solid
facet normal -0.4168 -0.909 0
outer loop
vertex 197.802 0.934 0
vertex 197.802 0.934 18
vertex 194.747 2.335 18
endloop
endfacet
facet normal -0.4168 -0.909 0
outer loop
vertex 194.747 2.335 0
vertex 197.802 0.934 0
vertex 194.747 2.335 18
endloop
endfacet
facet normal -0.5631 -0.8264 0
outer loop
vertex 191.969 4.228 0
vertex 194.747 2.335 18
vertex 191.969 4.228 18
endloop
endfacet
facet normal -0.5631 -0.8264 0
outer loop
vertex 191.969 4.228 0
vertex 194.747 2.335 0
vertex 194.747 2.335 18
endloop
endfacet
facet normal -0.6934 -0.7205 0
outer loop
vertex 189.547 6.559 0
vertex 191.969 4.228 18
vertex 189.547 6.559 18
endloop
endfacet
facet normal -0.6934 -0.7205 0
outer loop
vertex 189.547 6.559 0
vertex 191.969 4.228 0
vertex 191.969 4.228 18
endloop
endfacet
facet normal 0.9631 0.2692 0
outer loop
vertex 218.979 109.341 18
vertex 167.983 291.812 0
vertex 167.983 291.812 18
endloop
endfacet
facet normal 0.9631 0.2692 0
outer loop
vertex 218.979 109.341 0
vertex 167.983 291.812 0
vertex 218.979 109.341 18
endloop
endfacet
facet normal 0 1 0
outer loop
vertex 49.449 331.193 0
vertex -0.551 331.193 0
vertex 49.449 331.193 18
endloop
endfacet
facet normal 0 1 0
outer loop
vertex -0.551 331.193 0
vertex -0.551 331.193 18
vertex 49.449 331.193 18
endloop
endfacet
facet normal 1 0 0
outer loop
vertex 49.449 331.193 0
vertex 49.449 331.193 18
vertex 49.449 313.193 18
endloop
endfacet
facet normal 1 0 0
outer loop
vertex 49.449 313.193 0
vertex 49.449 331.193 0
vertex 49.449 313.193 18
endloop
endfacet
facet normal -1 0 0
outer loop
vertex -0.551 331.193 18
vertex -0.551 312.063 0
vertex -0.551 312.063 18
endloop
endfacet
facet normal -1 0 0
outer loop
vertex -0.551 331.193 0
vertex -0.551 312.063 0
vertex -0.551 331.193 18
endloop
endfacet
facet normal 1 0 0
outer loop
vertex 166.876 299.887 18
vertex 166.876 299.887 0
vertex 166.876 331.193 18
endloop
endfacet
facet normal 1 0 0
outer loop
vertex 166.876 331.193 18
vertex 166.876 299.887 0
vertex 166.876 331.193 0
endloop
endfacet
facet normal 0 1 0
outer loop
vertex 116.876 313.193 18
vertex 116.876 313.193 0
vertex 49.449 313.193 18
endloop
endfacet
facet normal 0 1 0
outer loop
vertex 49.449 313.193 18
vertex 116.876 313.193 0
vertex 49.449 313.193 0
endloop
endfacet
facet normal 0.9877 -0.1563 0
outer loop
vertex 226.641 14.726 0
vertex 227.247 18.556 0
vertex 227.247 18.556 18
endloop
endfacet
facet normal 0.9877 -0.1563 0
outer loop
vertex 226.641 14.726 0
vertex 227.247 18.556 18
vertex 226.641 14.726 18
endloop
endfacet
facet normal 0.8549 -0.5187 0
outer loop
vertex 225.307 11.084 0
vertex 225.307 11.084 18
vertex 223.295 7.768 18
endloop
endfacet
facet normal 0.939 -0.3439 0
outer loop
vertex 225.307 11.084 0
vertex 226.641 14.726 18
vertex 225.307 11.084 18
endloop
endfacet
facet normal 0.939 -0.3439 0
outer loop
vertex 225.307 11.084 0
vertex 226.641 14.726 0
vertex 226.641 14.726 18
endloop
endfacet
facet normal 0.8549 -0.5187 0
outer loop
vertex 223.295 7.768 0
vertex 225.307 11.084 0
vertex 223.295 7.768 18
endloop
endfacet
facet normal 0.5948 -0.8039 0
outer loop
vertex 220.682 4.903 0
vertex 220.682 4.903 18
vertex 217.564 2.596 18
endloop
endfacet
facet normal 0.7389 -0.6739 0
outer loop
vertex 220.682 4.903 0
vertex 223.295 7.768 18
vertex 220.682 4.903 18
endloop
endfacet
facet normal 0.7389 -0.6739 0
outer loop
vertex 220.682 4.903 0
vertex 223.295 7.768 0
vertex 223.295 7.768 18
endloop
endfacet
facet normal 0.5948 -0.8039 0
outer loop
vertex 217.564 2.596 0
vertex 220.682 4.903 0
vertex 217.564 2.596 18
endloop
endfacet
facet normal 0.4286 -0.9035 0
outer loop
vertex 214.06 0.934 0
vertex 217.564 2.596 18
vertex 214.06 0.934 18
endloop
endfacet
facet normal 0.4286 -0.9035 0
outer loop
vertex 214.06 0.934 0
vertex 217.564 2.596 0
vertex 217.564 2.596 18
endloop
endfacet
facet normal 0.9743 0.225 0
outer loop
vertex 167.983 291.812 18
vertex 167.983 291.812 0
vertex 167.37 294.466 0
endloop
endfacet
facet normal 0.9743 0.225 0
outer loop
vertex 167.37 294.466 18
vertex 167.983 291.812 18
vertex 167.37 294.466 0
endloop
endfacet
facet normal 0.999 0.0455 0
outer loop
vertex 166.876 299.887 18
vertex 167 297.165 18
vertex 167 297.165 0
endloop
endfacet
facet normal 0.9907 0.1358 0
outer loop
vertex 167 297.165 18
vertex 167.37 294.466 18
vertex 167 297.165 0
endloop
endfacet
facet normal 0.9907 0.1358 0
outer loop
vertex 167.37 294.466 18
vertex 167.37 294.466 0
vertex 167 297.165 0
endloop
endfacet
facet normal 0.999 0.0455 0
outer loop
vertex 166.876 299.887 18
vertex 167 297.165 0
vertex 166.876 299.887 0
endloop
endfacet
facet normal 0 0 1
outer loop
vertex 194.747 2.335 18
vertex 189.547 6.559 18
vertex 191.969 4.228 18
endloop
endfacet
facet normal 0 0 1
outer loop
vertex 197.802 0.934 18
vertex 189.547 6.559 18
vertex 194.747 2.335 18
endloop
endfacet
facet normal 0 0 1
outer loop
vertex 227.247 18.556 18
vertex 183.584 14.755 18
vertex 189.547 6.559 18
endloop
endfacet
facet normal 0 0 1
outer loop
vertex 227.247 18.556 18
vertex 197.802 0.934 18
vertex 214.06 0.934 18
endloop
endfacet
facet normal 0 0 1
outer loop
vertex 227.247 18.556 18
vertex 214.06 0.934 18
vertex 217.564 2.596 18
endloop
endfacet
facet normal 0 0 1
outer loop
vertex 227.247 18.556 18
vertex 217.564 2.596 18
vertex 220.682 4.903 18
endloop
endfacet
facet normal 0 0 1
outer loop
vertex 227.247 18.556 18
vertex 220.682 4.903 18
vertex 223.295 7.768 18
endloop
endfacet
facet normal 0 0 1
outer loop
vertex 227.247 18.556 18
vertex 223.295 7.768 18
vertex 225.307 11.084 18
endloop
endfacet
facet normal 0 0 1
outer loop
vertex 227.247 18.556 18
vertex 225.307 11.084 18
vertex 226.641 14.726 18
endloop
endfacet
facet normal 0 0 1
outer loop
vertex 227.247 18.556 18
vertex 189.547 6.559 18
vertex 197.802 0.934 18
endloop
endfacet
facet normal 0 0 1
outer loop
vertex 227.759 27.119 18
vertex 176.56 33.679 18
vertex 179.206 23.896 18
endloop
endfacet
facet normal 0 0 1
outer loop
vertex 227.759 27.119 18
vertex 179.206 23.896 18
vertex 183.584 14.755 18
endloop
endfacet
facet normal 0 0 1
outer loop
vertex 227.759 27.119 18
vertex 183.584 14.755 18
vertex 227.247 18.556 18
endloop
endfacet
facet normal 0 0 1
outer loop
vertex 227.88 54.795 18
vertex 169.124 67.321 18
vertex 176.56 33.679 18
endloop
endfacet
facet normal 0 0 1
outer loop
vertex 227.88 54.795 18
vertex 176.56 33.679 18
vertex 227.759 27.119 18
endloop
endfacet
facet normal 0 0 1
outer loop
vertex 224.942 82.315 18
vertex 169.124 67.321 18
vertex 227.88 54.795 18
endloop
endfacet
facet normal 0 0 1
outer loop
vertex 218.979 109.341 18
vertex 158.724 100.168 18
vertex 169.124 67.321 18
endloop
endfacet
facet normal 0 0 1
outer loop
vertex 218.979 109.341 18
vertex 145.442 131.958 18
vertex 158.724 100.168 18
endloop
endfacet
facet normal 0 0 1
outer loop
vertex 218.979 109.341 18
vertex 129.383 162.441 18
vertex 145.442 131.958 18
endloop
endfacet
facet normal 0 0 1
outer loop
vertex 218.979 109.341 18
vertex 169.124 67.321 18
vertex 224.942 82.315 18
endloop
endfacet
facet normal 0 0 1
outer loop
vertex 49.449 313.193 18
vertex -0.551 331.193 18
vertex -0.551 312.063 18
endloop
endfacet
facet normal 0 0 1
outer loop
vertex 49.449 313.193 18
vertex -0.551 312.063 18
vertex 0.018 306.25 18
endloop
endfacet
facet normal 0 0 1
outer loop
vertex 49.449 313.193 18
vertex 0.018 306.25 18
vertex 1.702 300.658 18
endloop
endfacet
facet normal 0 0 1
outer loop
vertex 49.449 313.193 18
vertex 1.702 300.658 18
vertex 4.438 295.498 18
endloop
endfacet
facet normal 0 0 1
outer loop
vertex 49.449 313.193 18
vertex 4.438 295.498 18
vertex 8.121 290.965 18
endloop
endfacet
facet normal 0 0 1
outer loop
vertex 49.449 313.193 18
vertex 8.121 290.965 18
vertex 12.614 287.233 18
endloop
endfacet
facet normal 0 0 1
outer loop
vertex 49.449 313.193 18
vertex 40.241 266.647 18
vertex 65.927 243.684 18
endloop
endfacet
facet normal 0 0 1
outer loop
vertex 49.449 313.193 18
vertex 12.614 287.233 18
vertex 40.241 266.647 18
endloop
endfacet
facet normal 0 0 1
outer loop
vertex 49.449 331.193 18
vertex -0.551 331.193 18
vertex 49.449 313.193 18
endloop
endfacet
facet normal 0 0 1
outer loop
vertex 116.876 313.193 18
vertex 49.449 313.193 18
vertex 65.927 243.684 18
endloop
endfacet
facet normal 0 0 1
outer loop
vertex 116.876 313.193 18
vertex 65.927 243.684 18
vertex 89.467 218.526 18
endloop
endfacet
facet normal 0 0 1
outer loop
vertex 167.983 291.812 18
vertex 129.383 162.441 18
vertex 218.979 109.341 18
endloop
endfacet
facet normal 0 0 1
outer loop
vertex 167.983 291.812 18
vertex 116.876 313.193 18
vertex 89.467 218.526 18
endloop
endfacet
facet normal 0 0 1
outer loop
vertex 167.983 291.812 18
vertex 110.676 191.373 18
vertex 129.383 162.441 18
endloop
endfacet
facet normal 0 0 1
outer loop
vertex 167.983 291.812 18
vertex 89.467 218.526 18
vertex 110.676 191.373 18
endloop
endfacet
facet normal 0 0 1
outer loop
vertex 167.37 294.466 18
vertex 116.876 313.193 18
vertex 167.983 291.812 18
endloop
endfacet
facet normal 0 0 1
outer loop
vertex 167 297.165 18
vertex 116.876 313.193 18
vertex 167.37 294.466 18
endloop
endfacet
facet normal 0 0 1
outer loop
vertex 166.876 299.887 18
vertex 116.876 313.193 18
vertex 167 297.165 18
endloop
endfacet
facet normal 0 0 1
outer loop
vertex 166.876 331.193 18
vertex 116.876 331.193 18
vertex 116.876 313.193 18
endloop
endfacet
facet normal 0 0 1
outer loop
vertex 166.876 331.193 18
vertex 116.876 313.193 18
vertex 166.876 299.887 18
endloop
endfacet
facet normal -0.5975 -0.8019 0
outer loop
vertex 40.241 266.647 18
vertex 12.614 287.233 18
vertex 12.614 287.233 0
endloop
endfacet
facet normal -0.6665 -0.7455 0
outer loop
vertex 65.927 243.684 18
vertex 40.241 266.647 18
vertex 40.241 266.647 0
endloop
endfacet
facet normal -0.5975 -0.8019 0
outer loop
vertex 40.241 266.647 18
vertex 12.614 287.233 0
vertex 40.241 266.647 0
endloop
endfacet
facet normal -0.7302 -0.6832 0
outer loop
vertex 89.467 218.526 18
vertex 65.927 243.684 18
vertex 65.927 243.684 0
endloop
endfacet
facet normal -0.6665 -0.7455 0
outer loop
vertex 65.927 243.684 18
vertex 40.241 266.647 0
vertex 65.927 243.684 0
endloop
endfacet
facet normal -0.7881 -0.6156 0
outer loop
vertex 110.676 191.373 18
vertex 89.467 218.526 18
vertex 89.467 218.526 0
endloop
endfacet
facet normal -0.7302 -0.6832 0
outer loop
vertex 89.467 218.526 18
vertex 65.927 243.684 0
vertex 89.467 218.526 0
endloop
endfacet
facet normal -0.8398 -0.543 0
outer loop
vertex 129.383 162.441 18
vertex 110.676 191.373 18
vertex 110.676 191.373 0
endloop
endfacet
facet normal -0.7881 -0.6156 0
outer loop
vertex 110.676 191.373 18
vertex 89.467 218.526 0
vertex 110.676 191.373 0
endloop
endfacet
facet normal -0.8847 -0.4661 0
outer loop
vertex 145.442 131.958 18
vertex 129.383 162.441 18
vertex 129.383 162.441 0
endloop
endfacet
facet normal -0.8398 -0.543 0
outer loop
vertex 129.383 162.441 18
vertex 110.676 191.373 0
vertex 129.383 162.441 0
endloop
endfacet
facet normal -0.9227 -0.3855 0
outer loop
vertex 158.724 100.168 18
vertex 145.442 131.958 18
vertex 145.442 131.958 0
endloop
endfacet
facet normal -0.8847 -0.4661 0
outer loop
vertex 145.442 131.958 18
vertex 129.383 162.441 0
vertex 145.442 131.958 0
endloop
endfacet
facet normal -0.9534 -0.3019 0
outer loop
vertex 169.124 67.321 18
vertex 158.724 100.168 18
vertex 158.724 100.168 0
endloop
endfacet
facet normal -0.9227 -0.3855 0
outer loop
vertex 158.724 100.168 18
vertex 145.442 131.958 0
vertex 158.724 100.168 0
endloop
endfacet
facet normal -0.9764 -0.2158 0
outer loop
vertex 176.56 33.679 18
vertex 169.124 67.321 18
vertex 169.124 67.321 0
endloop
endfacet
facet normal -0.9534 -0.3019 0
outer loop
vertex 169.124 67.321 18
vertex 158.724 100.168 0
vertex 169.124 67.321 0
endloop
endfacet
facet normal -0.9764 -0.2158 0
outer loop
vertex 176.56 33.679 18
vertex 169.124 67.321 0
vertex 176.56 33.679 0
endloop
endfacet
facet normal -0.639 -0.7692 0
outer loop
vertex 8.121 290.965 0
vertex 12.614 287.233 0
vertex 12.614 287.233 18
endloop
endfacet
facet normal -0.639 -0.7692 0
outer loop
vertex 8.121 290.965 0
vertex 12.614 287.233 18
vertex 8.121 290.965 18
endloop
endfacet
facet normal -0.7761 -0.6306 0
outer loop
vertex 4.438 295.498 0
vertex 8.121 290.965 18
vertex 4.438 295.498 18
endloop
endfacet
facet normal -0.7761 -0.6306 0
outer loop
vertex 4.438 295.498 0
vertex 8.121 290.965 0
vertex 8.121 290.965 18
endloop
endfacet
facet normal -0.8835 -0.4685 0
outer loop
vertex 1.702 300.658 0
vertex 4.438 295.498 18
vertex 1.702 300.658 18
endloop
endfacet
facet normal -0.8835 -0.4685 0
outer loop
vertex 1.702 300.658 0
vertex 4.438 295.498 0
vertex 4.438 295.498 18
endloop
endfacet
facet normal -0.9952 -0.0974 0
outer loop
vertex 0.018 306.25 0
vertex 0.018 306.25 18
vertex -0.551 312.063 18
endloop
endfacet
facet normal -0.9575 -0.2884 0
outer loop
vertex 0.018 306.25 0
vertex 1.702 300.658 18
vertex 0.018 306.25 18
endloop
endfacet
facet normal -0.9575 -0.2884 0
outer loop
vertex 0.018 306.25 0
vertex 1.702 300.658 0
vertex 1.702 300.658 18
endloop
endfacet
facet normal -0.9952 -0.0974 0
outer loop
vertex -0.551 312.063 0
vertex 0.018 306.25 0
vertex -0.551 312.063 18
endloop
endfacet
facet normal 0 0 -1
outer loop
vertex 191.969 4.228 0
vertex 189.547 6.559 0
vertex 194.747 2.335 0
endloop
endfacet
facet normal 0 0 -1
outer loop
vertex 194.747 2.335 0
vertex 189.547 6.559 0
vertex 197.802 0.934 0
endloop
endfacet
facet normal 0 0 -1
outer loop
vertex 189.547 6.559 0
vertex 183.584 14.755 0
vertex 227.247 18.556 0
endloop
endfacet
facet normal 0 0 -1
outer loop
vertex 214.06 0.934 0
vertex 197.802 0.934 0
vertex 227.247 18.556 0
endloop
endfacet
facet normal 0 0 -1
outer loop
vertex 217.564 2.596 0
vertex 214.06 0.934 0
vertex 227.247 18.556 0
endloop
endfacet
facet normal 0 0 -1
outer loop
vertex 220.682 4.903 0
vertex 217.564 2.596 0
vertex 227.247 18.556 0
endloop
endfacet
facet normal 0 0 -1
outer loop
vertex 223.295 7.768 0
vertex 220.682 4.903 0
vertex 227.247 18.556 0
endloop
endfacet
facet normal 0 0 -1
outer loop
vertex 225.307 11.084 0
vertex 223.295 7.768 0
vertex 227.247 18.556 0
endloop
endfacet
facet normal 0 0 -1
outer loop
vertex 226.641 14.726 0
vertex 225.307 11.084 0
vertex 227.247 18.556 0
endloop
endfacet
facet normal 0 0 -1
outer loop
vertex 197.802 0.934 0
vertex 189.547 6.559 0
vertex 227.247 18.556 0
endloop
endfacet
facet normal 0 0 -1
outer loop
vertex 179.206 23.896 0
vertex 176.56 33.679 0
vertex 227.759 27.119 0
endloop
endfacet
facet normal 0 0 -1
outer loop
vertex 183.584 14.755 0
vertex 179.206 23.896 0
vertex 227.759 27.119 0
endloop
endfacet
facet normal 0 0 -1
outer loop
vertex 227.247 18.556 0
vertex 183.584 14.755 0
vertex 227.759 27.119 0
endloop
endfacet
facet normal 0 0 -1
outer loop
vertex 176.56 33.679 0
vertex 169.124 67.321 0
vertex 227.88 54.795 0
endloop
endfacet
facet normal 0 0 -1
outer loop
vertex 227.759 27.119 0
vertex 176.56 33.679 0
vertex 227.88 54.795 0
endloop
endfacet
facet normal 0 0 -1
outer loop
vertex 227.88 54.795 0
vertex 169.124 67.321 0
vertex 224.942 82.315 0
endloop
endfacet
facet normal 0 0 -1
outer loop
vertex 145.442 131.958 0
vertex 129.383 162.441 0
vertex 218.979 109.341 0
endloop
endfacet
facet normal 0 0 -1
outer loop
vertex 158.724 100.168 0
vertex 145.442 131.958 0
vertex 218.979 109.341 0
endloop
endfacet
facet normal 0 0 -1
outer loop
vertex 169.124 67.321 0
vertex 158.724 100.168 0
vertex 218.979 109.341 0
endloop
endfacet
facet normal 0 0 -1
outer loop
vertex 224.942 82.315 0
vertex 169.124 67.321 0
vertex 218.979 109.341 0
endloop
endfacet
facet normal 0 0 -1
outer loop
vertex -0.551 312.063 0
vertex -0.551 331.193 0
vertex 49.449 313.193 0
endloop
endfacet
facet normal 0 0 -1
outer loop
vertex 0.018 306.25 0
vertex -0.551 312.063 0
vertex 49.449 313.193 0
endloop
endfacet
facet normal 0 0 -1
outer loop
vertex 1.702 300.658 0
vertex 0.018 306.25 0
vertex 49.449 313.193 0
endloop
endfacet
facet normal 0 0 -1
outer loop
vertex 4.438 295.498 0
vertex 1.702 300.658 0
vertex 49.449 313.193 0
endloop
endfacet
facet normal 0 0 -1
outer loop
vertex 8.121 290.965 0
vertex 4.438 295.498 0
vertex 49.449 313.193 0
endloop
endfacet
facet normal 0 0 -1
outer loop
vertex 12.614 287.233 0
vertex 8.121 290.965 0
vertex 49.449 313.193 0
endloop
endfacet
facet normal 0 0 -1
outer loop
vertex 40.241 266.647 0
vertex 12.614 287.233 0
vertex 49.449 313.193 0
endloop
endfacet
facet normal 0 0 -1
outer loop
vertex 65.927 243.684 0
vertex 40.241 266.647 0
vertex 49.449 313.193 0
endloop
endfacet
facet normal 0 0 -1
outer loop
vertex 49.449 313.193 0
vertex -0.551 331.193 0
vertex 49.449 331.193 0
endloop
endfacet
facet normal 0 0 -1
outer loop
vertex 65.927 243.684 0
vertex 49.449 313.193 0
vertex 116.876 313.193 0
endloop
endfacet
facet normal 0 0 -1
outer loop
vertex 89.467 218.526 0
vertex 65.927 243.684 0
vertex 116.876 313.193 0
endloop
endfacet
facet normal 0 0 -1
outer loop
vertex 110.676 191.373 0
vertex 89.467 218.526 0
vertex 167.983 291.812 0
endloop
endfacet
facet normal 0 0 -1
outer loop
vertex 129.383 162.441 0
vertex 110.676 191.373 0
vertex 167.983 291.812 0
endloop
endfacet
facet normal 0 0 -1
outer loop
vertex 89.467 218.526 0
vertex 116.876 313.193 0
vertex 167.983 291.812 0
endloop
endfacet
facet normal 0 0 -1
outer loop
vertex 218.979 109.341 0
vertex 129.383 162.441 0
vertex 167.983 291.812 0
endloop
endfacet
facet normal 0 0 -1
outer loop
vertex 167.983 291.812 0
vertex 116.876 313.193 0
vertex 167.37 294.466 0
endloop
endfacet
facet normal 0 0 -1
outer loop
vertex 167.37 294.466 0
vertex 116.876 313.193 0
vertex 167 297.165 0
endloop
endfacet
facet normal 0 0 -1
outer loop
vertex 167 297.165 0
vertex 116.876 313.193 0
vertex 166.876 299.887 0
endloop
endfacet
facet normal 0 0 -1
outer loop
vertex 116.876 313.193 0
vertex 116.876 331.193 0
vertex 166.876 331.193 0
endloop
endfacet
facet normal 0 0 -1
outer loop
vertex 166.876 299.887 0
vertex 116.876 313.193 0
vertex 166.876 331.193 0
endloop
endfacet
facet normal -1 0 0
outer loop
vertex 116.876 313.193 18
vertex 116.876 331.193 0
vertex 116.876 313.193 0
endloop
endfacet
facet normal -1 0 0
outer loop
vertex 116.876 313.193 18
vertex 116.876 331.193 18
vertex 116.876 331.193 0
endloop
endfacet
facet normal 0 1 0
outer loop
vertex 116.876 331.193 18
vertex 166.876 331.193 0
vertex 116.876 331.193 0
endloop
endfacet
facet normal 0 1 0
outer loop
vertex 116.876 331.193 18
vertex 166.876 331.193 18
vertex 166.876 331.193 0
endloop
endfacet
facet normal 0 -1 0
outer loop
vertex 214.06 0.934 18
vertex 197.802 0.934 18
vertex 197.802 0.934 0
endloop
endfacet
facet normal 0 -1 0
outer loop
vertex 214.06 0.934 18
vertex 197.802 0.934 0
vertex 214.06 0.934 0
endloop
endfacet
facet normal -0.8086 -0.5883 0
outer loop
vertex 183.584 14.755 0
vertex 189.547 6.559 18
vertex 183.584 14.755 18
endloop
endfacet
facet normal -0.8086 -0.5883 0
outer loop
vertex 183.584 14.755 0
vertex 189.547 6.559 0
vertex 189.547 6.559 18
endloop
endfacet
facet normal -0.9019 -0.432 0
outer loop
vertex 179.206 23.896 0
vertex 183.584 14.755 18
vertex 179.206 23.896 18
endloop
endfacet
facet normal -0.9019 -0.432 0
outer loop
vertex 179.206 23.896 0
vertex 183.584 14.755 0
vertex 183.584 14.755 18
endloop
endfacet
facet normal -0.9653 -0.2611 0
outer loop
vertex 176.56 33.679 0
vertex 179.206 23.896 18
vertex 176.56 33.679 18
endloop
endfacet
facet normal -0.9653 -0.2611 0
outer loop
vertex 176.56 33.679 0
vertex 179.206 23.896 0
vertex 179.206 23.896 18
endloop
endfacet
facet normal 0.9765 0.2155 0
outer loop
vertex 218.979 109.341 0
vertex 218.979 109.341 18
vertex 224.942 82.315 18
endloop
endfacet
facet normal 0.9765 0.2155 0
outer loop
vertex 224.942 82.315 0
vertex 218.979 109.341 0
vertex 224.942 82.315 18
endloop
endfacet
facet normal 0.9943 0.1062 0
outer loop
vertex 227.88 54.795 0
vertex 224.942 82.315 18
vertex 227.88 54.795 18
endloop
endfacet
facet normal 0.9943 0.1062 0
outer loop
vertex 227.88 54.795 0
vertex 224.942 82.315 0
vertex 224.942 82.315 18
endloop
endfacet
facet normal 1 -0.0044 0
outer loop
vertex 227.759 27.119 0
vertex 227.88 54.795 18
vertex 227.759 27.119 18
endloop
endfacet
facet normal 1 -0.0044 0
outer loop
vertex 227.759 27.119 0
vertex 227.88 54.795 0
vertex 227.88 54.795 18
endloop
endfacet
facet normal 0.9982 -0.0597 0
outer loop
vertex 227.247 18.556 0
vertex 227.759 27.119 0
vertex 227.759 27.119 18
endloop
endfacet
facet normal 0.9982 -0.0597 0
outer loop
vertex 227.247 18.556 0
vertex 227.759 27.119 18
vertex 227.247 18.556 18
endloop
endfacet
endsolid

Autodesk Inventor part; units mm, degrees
ref_plane "YZ Plane" through (0, 0, 0) normal (1, 0, 0) x (0, 1, 0)
ref_plane "XZ Plane" through (0, 0, 0) normal (0, 1, 0) x (-1, 0, 0)
ref_plane "XY Plane" through (0, 0, 0) normal (0, 0, 1) x (1, 0, 0)
sketch "Sketch1" plane through (0, 0, 0) normal (0, 0, 1) x (1, 0, 0)
  arc A0 (176.5598, 33.6793) -> (12.6136, 287.2326) centre (-204.4335, -32.8889) ccw
  line L0 (167.9834, 291.8121) -> (218.9792, 109.3407)
  arc A1 (227.759, 27.1192) -> (218.9792, 109.3407) centre (-21.7947, 42.0509) ccw
  arc A2 (207.2823, -0.2492) -> (227.2466, 18.5563) centre (207.2823, 19.7508) ccw
  arc A3 (176.5598, 33.6793) -> (189.5473, 6.5592) centre (231.3648, 43.255) ccw
  arc A4 (189.5473, 6.5592) -> (204.58, -0.2492) centre (204.58, 19.7508) ccw
  line L1 (207.2823, -0.2492) -> (204.58, -0.2492)
  line L2 (227.759, 27.1192) -> (227.2466, 18.5563)
  arc A5 (248.2588, 303.6927) -> (197.3635, 355.4189) centre (196.5258, 303.6927) ccw
  line L3 (248.2588, 303.6927) -> (248.2588, 286.4547)
  arc A6 (222.3411, 252.6536) -> (248.2588, 286.4547) centre (213.2588, 286.4547) ccw
  line L4 (-281.6446, 363.1761) -> (197.3635, 355.4189)
  arc A7 (222.3411, 252.6536) -> (-337.0597, 3.3874) centre (731.561, -1642.4666) ccw
  line L5 (297.4263, 347.2322) -> (-473.2183, 347.2322) construction
  line L6 (-303.5209, 267.588) -> (-100.5419, 267.588)
  line L7 (-94.1908, 238.9989) -> (-285.5647, 149.5573)
  arc A8 (-94.1908, 238.9989) -> (-100.5419, 267.588) centre (-100.5419, 252.588) ccw
  arc A9 (-316.1527, 274.4986) -> (-303.5209, 267.588) centre (-303.5209, 282.588) ccw
  line L8 (-324.4601, 363.1761) -> (-281.6446, 363.1761)
  line L9 (-353.5533, 332.9002) -> (-316.1527, 274.4986)
  arc A10 (-324.4601, 363.1761) -> (-354.3192, 336.0808) centre (-324.4601, 333.1761) ccw
  arc A11 (-354.3192, 336.0808) -> (-353.5533, 332.9002) centre (-349.3427, 335.5967) ccw
  arc A12 (-358.3707, 23.1982) -> (-337.0597, 3.3874) centre (-345.2282, 15.9682) ccw
  line L10 (-292.3562, 143.1982) -> (-358.3707, 23.1982)
  arc A13 (-285.5647, 149.5573) -> (-292.3562, 143.1982) centre (-279.2137, 135.9682) ccw
  line L11 (-280.0505, 115.5231) -> (-264.2795, 106.8471)
  line L12 (-288.3795, 63.0385) -> (-264.2795, 106.8471)
  line L13 (-304.1505, 71.7145) -> (-288.3795, 63.0385)
  line L14 (-304.1505, 71.7145) -> (-280.0505, 115.5231)
  line L15 (-300.243, 286.193) -> (-282.243, 286.193)
  line L16 (-282.243, 336.193) -> (-300.243, 336.193)
  line L17 (-300.243, 336.193) -> (-300.243, 286.193)
  line L18 (199.757, 276.193) -> (181.757, 276.193)
  line L19 (181.757, 276.193) -> (181.757, 336.193)
  line L20 (181.757, 336.193) -> (199.757, 336.193)
  line L21 (199.757, 336.193) -> (199.757, 276.193)
  line L22 (-350.0834, 336.193) -> (288.2929, 336.193) construction
  line L23 (-282.243, 286.193) -> (-282.243, 336.193)
  line L24 (-194.243, 331.193) -> (-194.243, 313.193)
  line L25 (-94.243, 331.193) -> (-94.243, 313.193)
  line L26 (-194.243, 331.193) -> (-94.243, 331.193)
  line L27 (-94.243, 313.193) -> (-194.243, 313.193)
  line L28 (-282.243, 346.193) -> (-282.243, 276.193)
  line L29 (-282.243, 313.193) -> (-282.243, 331.193)
  line L30 (-282.243, 276.193) -> (-300.243, 276.193)
  line L31 (-300.243, 276.193) -> (-300.243, 346.193)
  line L32 (-300.243, 346.193) -> (-282.243, 346.193)
  line L33 (-6.243, 331.193) -> (-6.243, 313.193)
  line L34 (-6.243, 331.193) -> (93.757, 331.193)
  line L35 (93.757, 313.193) -> (-6.243, 313.193)
  line L36 (93.757, 331.193) -> (93.757, 313.193)
  line L37 (181.757, 331.193) -> (181.757, 313.193)
  line L38 (181.757, 346.193) -> (181.757, 266.193)
  line L39 (199.757, 346.193) -> (181.757, 346.193)
  line L40 (181.757, 266.193) -> (199.757, 266.193)
  line L41 (199.757, 266.193) -> (199.757, 346.193)
  line L42 (-0.5508, 312.0632) -> (-0.5508, 313.193)
  line L43 (166.8762, 299.8869) -> (166.8762, 313.193)
  line L44 (166.8762, 313.193) -> (-0.5508, 313.193)
  line L45 (166.8762, 313.193) -> (166.8762, 331.193)
  line L46 (166.8762, 331.193) -> (116.8762, 331.193)
  line L47 (116.8762, 331.193) -> (116.8762, 313.193)
  line L48 (-0.5508, 313.193) -> (-0.5508, 331.193)
  line L49 (-0.5508, 331.193) -> (49.4492, 331.193)
  line L50 (49.4492, 331.193) -> (49.4492, 313.193)
  arc A14 (-0.5508, 312.0632) -> (12.6136, 287.2326) centre (29.4492, 312.0632) ccw
  arc A15 (166.8762, 299.8869) -> (167.9834, 291.8121) centre (196.8762, 299.8869) ccw
  point P0 (0, 0)
  point P1 (-0.5508, 295.7736)
  point P2 (166.8762, 295.7736)
  point P3 (263.5097, 263.2389)
  point P4 (-311.7271, 267.588)
  point P5 (-289.9977, 147.4855)
  point P6 (-388.1512, -30.9362)
  point P7 (-291.243, 346.193)
  point P8 (372.0119, 346.193)
  dimension "d0" = 20
  dimension "d1" = 250
  dimension "d32" = 15
  dimension "d33" = 35
  dimension "d34" = 120
  dimension "d35" = 30
  dimension "d36" = 5
  dimension "d37" = 50
  dimension "d38" = 60
  dimension "d39" = 18
  dimension "d40" = 500
  dimension "d41" = 70
  dimension "d42" = 80
  dimension "d43" = 18
  dimension "d44" = 464
  dimension "d45" = 100
  dimension "d46" = 100
  dimension "d47" = 88
  dimension "d48" = 88
  dimension "d49" = 50
  dimension "d50" = 50
  dimension "d51" = 30
  dimension "d52" = 5.6922
  dimension "d53" = 67.427
  dimension "d54" = 30
extrude "Extrusion1" add sketch "Sketch1" along normal blind 18 contours A0 A7 L0 A1 L2 A2 L1 A4 A3 | A0 A14 L42 L35 L44 L43 A15 L0 A7
sketch "Sketch7" plane through (0, 0, 18) normal (0, 0, 1) x (1, 0, 0)
  line L0 (166.8762, 313.193) -> (166.8762, 331.193)
  line L1 (166.8762, 331.193) -> (116.8762, 331.193)
  line L2 (116.8762, 331.193) -> (116.8762, 313.193)
  line L3 (-0.5508, 313.193) -> (-0.5508, 331.193)
  line L4 (-0.5508, 331.193) -> (49.4492, 331.193)
  line L5 (49.4492, 331.193) -> (49.4492, 313.193)
  line L6 (166.8762, 313.193) -> (116.8762, 313.193)
  line L7 (49.4492, 313.193) -> (-0.5508, 313.193)
  point P0 (0, 0)
  dimension "d67" = 50
  dimension "d68" = 50
  dimension "d69" = 67.427
extrude "Extrusion5" add sketch "Sketch7" against normal blind 18
sketch "Sketch8" plane through (0, 0, 18) normal (0, 0, 1) x (1, 0, 0)
  line L0 (195.4129, 0.9342) -> (223.5969, 0.9342)
  line L1 (223.5969, 0.9342) -> (223.5969, -9.3542)
  line L2 (223.5969, -9.3542) -> (195.4129, -9.3542)
  line L3 (195.4129, -9.3542) -> (195.4129, 0.9342)
  point P0 (0, 0)
extrude "Extrusion6" cut sketch "Sketch8" against normal blind 18
properties part number "Pata" material "Wood (Birch)"
